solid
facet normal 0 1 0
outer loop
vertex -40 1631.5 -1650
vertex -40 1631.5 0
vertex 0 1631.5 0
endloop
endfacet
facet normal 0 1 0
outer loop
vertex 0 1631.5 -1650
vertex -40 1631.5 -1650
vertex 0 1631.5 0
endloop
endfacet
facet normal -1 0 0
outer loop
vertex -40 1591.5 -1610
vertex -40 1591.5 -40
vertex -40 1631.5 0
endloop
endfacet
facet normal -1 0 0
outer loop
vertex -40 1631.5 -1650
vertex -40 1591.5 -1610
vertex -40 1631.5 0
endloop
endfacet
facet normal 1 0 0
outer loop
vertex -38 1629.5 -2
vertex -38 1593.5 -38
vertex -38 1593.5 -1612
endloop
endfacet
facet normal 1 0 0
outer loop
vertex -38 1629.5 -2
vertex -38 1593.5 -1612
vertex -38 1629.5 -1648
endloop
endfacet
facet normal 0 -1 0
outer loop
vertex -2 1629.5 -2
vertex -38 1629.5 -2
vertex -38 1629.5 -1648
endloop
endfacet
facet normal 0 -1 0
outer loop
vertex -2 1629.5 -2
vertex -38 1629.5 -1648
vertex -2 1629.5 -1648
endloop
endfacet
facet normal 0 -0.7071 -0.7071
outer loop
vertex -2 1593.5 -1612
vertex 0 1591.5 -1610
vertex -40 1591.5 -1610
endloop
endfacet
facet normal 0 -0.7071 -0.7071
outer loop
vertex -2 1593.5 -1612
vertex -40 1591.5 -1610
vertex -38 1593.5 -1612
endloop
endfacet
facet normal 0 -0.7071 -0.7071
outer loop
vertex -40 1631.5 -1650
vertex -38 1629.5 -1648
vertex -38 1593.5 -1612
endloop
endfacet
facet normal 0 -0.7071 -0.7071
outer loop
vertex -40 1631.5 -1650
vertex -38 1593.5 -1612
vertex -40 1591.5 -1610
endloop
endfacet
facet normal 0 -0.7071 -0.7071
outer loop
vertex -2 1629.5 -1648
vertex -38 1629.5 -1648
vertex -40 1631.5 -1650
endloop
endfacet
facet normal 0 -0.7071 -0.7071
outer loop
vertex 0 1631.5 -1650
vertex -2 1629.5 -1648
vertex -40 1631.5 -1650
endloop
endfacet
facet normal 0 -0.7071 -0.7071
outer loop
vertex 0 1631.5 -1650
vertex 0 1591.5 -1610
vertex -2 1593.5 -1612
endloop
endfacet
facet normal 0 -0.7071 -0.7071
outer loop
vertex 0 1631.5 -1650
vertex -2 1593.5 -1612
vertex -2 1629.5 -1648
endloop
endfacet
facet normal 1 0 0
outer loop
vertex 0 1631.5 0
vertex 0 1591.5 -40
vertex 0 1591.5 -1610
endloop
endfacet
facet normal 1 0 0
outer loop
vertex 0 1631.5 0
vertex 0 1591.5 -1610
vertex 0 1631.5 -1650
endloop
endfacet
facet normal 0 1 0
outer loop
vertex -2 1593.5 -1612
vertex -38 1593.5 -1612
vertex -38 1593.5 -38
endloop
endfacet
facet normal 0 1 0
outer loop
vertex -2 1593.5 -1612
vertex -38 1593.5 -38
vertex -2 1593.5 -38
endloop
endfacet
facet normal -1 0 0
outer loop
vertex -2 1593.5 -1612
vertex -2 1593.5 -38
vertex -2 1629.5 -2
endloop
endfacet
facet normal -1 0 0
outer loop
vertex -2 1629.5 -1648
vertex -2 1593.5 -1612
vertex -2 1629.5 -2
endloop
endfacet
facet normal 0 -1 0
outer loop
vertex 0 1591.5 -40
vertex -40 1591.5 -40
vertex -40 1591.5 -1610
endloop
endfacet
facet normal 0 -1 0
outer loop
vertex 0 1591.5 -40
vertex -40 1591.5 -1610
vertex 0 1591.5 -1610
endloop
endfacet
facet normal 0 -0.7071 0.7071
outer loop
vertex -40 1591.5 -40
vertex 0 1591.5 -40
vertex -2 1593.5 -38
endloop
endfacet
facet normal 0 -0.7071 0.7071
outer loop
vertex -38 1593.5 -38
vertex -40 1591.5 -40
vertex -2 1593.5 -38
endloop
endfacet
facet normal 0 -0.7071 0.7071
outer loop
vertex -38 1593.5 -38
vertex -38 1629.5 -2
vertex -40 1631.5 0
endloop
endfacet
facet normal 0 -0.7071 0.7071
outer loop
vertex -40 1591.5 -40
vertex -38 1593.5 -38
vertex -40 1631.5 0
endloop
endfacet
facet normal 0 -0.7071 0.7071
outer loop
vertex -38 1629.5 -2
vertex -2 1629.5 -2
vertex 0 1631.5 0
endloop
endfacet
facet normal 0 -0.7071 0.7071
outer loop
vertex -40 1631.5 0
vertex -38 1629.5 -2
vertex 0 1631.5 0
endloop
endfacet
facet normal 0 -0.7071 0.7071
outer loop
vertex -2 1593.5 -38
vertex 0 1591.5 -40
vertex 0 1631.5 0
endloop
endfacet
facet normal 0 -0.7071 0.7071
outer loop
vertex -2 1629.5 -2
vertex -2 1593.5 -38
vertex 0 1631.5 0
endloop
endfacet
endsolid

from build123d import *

# Parameters (mm, degrees)
SKETCH1_W           = 40
SKETCH1_H           = 40
SKETCH1_W_2         = 36
SKETCH1_H_2         = 36
BOSS_EXTRUDE1_DEPTH = 1650
CUT_EXTRUDE1_REACH  = 2322.753


with BuildPart() as part:
    # Sketch1 → Boss-Extrude1 (new body)
    with BuildSketch(Plane.XY):
        with Locations((-20, 1611.5)):
            Rectangle(SKETCH1_W, SKETCH1_H)
        with Locations((-20, 1611.5)):
            Rectangle(SKETCH1_W_2, SKETCH1_H_2, mode=Mode.SUBTRACT)
    extrude(amount=-BOSS_EXTRUDE1_DEPTH)

    # Cut-Extrude1: up to this face of the body (flat: up to its plane)
    cut_extrude1_end = Plane(part.part.faces().sort_by_distance((-40, 1611.5, -825))[0])
    # Sketch2 → Cut-Extrude1 (cut, up to the picked face)
    with BuildSketch(Plane(origin=(0, 0, 0), x_dir=(0, 0, -1), z_dir=(1, 0, 0)), mode=Mode.PRIVATE) as cut_extrude1_sk1:
        Polygon((0, 1631.5), (0, 1591.5), (40, 1591.5), align=None)
    cut_extrude1_tool1 = split(extrude(cut_extrude1_sk1.sketch, amount=-CUT_EXTRUDE1_REACH, mode=Mode.PRIVATE), bisect_by=cut_extrude1_end, keep=Keep.BOTH, mode=Mode.PRIVATE)
    # Sketch2 → Cut-Extrude1 (cut, up to the picked face)
    with BuildSketch(Plane(origin=(0, 0, 0), x_dir=(0, 0, -1), z_dir=(1, 0, 0)), mode=Mode.PRIVATE) as cut_extrude1_sk2:
        Polygon((1610, 1591.5), (1650, 1631.5), (1650, 1591.5), align=None)
    cut_extrude1_tool2 = split(extrude(cut_extrude1_sk2.sketch, amount=-CUT_EXTRUDE1_REACH, mode=Mode.PRIVATE), bisect_by=cut_extrude1_end, keep=Keep.BOTH, mode=Mode.PRIVATE)
    add(cut_extrude1_tool1.solids().sort_by(Axis((0, 1604.833333, -13.333333), (-1, 0, 0)))[0], mode=Mode.SUBTRACT)
    add(cut_extrude1_tool2.solids().sort_by(Axis((0, 1604.833333, -1636.666667), (-1, 0, 0)))[0], mode=Mode.SUBTRACT)


solid = part.part
